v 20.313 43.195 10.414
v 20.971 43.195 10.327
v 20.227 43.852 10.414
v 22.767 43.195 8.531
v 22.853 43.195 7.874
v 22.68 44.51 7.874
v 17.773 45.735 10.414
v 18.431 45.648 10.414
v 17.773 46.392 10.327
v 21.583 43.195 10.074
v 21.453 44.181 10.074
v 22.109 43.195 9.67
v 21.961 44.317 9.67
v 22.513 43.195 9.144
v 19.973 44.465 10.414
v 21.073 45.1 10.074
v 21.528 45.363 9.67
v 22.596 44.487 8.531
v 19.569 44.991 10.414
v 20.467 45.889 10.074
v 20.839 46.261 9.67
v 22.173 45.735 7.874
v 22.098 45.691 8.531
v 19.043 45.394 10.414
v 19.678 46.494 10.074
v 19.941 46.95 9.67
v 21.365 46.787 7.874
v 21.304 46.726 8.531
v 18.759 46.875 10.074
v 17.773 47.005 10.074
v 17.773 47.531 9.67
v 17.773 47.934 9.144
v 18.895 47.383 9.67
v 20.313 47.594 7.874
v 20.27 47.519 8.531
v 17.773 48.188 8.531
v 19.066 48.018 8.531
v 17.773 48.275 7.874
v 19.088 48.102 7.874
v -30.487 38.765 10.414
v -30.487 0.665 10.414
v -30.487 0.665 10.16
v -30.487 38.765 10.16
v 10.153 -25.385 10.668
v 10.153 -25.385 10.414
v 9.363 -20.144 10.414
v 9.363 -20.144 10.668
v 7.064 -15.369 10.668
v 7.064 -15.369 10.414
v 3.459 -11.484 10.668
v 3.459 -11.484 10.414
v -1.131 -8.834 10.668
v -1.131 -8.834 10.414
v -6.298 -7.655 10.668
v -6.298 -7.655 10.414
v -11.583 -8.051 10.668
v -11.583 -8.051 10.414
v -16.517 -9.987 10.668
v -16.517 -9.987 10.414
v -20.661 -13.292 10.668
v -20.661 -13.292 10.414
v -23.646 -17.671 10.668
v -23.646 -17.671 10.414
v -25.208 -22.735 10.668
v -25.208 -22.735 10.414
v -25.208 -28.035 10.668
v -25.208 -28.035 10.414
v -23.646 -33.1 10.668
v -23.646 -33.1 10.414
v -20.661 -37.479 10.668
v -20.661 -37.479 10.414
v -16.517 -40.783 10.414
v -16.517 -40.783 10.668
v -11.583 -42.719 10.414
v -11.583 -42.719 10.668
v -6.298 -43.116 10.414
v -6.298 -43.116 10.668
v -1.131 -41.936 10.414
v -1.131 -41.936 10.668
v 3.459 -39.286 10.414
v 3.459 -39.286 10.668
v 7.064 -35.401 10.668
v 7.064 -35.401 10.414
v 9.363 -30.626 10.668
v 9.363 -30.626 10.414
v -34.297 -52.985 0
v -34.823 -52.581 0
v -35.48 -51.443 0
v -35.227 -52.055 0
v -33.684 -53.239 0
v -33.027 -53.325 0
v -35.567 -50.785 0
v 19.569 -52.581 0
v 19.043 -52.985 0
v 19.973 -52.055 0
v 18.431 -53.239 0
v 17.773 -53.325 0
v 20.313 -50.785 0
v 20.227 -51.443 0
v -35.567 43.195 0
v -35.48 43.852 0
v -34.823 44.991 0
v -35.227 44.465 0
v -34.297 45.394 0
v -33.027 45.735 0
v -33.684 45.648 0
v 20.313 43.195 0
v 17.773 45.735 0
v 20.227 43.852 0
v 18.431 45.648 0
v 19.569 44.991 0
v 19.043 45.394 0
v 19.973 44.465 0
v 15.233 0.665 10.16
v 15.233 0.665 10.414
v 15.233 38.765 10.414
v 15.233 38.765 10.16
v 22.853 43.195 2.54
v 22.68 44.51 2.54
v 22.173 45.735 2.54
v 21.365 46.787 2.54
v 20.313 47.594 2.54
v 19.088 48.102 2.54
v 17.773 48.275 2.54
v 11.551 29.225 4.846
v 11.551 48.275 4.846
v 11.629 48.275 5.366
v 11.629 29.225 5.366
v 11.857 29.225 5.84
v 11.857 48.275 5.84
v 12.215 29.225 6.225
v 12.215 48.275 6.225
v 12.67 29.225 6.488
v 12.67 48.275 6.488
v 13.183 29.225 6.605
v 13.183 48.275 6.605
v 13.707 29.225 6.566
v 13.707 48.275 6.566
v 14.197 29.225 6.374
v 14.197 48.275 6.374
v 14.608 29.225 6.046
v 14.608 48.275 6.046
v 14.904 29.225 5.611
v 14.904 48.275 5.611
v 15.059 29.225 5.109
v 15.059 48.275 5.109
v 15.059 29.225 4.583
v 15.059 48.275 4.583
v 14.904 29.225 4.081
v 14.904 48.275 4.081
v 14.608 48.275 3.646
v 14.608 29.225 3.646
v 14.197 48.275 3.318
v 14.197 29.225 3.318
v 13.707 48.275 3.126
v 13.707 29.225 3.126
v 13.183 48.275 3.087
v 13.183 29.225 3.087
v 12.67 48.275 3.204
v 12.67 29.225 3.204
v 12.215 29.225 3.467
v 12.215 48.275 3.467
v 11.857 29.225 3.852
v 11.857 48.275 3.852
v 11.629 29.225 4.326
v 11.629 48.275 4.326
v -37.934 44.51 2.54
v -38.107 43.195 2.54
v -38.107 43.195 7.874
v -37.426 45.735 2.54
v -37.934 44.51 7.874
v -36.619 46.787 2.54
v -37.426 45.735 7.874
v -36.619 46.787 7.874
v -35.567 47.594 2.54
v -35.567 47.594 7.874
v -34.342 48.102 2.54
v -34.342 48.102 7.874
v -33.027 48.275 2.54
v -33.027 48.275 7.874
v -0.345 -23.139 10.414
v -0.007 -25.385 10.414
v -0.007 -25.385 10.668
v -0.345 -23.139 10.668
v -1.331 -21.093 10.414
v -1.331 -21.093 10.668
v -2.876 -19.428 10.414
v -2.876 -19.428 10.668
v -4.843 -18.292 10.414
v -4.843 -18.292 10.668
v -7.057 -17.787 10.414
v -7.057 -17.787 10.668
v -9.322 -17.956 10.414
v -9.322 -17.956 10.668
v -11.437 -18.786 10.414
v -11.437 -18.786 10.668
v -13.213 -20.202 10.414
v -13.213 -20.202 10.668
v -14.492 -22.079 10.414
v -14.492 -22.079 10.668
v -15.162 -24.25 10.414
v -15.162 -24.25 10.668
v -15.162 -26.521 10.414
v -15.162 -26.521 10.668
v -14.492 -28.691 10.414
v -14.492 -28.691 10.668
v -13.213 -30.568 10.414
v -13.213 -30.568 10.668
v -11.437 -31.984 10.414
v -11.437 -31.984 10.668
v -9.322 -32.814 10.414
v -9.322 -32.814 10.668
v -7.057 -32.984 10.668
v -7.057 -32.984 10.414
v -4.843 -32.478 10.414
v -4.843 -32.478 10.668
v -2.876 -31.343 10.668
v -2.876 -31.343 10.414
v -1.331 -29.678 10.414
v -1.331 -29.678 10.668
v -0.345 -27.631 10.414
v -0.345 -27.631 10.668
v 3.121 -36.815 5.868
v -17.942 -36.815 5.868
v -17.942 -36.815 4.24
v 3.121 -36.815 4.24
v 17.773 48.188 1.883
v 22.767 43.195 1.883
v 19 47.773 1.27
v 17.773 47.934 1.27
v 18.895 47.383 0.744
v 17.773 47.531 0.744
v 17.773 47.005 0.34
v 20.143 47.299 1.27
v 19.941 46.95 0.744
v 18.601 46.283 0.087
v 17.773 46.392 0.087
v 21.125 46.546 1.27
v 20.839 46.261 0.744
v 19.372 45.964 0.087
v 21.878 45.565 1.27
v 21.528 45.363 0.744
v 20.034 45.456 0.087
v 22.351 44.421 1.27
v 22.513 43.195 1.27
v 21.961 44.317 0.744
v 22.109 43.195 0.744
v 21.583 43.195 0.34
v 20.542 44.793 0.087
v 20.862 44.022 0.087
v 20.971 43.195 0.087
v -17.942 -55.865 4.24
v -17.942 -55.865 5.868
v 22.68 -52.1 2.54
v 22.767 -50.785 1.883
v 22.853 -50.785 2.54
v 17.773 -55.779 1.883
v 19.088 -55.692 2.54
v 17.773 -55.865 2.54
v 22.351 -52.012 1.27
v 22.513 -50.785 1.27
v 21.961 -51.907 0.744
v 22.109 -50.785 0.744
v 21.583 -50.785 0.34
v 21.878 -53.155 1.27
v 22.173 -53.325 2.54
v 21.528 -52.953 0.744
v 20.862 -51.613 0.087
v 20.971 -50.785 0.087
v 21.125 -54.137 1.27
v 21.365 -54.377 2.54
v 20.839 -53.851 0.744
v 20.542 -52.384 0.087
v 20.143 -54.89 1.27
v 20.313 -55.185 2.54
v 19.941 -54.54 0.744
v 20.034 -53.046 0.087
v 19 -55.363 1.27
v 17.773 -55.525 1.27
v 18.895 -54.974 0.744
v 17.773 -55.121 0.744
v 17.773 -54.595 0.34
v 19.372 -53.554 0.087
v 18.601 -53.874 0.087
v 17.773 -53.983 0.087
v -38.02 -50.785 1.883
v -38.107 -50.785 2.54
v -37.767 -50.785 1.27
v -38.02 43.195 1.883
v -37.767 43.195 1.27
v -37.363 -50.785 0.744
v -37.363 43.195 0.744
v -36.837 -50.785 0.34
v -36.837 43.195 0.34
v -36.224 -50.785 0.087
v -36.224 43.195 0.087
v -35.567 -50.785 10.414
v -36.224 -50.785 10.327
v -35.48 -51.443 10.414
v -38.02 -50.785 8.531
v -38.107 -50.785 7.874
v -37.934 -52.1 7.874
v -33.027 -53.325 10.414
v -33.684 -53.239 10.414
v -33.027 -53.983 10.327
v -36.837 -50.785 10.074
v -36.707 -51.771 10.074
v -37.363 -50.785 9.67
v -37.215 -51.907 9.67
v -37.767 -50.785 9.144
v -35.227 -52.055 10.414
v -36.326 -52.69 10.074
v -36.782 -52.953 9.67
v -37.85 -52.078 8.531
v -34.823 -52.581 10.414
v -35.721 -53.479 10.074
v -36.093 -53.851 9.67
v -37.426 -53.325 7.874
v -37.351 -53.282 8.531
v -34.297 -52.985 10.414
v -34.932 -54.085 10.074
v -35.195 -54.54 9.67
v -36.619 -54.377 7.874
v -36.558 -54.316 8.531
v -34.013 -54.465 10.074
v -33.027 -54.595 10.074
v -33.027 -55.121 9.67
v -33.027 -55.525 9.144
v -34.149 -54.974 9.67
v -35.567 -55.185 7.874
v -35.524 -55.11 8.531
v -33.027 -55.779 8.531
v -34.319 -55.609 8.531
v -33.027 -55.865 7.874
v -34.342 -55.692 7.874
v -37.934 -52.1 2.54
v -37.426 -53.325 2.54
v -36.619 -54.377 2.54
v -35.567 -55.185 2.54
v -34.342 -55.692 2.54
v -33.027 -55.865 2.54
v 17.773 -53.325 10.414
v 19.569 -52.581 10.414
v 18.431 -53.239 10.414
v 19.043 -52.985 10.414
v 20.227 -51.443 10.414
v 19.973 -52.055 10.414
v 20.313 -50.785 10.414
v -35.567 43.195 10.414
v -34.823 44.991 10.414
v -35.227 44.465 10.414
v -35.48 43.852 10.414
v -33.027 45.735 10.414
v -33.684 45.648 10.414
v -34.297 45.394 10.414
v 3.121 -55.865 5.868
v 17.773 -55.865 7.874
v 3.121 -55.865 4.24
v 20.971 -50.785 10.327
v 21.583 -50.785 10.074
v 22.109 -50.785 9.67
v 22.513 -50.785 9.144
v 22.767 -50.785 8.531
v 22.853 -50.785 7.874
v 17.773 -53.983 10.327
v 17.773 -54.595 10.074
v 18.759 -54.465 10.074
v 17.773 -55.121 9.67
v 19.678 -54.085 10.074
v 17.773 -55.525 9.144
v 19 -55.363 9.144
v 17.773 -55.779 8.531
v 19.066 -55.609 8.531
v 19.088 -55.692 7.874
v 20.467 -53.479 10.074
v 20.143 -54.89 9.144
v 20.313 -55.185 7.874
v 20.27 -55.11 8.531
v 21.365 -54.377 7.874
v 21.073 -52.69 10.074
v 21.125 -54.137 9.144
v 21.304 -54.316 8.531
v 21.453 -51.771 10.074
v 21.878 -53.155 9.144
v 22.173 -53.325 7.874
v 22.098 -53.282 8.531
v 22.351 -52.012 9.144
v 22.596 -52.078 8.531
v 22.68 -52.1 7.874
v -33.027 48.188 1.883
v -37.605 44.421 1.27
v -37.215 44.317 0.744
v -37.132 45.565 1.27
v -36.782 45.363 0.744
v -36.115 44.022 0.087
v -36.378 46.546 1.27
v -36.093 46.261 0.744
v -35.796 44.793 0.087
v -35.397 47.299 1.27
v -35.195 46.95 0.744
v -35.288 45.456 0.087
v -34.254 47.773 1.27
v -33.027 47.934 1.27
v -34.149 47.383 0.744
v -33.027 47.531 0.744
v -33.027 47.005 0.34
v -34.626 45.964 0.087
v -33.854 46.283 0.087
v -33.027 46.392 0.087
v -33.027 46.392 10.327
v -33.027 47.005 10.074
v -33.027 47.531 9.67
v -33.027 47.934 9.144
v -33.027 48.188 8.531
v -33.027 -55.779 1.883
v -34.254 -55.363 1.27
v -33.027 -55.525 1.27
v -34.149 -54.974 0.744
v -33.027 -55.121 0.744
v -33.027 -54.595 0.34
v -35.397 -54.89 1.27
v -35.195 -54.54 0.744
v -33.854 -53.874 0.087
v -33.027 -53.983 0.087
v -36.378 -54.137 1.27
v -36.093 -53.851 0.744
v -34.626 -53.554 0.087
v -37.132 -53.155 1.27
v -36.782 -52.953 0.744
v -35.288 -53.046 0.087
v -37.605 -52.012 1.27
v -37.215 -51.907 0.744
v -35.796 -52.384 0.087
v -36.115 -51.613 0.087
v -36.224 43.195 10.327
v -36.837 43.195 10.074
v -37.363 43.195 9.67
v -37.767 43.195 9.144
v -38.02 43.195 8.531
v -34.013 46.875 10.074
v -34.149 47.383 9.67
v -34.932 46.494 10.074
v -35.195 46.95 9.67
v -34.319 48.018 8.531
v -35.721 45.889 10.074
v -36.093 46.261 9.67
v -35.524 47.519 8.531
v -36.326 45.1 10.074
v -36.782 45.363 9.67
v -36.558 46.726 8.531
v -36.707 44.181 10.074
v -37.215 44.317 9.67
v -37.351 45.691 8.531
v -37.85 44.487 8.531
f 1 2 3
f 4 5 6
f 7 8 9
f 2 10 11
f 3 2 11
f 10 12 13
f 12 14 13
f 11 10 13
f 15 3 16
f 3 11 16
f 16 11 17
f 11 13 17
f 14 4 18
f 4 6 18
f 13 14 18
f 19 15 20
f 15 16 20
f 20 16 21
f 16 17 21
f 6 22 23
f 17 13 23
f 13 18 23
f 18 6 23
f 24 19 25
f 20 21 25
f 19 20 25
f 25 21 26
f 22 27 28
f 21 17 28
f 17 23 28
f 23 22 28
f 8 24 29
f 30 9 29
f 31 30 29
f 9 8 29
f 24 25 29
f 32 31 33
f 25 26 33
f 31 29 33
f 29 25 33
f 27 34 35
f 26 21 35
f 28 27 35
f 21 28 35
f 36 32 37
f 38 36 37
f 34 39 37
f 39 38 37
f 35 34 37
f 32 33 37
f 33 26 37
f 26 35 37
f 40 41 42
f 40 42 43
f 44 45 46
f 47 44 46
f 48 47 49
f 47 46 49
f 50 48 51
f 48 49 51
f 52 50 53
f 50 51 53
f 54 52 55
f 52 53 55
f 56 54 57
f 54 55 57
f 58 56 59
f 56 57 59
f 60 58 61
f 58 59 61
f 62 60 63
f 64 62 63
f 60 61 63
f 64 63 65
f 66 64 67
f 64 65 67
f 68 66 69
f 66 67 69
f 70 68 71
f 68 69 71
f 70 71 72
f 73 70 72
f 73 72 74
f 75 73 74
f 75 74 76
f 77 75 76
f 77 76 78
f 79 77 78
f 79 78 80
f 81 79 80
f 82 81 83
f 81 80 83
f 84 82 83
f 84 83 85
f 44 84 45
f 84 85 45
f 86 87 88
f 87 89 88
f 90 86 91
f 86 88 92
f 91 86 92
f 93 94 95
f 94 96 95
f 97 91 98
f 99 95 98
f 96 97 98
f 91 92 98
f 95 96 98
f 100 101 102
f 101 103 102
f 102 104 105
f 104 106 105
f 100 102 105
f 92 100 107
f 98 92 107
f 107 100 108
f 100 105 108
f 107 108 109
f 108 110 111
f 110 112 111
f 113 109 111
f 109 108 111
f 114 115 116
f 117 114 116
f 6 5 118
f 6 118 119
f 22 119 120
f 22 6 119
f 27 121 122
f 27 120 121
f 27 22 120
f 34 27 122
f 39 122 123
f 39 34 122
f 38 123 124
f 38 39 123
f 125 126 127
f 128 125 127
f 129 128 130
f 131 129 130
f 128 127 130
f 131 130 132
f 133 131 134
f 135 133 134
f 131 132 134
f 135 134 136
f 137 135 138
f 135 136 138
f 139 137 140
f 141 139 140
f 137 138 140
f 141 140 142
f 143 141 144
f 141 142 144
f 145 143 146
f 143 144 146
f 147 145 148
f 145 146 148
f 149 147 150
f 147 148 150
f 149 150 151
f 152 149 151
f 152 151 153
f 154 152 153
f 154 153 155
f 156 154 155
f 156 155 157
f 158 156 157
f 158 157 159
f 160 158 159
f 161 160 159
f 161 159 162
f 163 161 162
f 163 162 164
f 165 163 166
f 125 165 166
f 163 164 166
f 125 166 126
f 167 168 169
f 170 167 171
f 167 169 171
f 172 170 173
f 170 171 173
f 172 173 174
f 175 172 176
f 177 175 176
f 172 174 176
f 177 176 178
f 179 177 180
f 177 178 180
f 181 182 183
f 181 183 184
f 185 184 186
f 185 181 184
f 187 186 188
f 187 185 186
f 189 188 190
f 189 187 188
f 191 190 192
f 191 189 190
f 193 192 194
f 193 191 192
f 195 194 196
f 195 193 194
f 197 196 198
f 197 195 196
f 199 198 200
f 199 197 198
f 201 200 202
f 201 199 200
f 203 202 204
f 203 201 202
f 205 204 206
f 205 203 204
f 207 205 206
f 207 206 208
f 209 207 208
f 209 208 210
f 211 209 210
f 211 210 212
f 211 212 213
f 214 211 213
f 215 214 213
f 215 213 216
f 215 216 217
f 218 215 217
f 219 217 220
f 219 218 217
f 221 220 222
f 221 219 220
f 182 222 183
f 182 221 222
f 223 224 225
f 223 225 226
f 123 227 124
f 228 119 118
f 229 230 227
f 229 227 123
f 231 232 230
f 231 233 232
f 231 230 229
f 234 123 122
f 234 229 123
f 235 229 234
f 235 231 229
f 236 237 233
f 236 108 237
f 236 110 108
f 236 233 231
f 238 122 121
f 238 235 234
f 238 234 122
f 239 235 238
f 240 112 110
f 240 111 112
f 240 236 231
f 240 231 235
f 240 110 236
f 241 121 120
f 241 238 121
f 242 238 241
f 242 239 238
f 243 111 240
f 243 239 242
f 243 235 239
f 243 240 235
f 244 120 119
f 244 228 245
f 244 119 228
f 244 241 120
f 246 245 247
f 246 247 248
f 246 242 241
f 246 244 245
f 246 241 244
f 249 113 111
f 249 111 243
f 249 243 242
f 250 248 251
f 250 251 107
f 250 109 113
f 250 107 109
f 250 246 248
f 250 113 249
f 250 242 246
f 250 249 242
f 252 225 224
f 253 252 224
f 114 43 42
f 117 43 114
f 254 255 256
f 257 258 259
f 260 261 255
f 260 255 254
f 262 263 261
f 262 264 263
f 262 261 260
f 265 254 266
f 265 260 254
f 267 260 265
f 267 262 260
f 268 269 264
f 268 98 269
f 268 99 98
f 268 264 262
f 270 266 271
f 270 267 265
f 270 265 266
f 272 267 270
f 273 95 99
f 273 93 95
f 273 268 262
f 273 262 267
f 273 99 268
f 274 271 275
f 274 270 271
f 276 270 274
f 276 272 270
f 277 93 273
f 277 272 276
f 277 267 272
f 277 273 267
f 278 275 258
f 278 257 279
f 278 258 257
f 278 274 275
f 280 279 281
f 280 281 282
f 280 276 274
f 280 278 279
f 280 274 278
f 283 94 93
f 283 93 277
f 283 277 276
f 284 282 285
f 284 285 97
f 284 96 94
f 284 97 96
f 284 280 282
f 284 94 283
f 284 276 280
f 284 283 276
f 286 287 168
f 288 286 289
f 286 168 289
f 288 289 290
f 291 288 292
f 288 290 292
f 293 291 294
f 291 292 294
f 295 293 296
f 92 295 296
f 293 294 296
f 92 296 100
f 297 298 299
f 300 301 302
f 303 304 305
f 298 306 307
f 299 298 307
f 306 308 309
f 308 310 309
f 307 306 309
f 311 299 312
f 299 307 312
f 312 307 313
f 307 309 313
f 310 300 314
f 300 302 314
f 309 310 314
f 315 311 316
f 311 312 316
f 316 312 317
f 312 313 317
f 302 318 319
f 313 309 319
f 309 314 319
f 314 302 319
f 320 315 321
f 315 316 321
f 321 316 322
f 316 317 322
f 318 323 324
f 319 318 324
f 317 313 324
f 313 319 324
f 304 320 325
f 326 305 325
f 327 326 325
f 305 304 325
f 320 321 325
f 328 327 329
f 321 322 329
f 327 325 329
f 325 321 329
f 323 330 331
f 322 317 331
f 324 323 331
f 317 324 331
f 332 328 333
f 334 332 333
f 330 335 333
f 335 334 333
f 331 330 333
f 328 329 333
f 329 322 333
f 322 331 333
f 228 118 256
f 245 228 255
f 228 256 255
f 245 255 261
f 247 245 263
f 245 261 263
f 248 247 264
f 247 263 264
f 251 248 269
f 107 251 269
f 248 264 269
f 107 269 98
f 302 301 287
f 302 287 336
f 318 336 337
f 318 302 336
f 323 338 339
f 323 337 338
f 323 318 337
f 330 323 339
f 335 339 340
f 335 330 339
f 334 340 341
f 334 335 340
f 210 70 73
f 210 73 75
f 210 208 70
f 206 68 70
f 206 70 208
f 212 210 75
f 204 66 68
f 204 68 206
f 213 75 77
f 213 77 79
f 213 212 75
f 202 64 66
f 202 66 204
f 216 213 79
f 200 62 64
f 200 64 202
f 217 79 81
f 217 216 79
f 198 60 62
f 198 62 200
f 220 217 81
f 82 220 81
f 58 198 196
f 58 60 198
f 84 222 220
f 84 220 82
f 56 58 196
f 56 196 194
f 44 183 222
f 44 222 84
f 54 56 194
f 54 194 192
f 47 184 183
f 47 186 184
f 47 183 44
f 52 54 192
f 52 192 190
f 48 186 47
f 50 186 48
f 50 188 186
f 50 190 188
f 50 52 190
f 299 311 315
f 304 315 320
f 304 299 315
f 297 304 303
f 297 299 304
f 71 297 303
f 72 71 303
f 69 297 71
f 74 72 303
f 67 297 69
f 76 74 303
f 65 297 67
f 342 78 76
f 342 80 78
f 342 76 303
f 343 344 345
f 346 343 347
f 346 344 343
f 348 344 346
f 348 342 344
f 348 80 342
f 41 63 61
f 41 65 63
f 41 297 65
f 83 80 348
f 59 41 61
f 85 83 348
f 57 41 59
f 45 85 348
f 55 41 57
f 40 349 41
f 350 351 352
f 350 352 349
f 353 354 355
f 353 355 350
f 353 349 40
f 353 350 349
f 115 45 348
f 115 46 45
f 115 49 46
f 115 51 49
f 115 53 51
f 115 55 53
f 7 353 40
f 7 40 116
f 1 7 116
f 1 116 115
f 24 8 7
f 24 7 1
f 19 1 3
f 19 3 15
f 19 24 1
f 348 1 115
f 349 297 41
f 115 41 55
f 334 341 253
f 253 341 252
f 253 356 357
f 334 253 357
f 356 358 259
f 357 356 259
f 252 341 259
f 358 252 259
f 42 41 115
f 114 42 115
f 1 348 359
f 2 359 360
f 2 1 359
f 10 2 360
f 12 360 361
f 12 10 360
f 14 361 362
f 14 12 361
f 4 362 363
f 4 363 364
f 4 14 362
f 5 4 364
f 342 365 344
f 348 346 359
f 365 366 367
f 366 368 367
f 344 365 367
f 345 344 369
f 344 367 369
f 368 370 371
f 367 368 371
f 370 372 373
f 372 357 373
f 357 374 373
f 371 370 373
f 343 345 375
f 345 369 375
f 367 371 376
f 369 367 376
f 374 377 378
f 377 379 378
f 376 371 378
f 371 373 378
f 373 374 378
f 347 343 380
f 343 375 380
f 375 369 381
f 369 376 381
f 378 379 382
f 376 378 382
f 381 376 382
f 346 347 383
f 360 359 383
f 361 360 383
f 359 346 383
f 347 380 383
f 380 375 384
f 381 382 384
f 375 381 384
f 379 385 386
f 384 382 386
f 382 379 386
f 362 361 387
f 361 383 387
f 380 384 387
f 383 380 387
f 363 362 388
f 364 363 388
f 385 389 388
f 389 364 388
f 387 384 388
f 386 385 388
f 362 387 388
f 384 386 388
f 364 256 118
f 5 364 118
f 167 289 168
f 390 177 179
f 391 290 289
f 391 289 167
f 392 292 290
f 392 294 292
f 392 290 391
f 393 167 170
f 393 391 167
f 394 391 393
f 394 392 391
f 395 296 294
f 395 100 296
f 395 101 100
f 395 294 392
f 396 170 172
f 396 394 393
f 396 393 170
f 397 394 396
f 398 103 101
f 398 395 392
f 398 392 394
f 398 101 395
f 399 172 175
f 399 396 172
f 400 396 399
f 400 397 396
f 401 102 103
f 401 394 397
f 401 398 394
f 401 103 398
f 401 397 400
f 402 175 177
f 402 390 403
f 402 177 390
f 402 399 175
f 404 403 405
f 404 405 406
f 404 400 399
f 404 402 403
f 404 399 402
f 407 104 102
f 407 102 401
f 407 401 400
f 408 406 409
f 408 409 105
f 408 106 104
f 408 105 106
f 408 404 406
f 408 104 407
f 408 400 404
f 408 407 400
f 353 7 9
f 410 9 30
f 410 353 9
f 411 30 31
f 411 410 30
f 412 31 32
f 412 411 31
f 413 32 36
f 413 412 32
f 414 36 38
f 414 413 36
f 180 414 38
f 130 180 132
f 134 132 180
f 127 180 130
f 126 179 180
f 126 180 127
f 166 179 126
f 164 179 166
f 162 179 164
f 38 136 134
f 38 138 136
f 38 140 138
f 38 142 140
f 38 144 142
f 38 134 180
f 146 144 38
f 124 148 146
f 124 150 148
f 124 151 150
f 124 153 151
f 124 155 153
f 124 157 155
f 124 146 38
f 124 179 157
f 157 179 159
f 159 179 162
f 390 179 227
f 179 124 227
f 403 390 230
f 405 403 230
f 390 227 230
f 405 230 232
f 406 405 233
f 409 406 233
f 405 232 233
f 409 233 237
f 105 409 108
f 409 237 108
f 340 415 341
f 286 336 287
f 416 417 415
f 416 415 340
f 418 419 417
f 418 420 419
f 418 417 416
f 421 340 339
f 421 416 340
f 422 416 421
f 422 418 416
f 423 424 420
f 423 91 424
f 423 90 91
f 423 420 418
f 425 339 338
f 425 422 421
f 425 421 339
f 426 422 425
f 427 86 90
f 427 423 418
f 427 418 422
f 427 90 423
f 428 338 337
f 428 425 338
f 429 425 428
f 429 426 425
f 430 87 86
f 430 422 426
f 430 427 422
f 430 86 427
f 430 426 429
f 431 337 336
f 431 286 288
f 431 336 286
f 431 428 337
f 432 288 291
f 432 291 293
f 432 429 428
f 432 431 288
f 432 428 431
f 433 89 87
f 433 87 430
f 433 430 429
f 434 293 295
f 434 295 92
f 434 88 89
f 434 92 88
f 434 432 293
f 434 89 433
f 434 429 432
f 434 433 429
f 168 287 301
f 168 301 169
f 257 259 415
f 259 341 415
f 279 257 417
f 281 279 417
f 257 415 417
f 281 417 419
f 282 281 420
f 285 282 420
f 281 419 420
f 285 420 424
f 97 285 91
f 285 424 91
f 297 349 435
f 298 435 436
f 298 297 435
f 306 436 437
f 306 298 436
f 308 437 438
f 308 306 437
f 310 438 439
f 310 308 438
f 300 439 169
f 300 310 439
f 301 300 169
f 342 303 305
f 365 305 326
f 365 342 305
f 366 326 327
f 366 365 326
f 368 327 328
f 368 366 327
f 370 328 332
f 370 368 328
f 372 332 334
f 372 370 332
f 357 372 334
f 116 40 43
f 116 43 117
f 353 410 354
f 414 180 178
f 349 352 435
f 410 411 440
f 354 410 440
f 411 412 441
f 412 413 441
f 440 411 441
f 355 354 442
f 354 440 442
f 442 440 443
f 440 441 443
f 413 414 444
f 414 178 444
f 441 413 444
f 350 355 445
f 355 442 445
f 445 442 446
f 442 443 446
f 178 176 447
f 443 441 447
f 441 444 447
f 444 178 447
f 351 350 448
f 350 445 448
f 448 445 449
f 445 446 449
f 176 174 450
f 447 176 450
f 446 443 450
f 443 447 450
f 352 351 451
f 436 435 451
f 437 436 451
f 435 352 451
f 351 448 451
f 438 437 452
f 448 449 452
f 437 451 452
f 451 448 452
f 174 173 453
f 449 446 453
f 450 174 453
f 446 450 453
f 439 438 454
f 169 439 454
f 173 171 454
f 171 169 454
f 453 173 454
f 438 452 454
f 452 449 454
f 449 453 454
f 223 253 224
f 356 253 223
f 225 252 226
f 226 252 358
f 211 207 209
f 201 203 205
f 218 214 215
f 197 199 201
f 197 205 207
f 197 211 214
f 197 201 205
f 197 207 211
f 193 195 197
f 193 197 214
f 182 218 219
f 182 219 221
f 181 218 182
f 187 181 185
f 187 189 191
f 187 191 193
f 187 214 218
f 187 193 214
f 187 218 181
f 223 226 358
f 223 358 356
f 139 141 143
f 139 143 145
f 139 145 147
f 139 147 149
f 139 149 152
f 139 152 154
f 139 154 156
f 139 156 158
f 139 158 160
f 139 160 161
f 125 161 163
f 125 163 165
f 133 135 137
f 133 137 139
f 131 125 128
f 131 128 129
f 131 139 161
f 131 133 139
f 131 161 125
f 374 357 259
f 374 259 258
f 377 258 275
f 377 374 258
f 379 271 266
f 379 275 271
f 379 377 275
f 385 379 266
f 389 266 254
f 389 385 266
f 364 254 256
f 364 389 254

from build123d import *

# Parameters (mm, degrees)
F0_W      = 60.96
F0_H      = 104.14
F1_DEPTH  = 10.414
F2_R      = 5.08
F3_R      = 17.78
F3_R_2    = 7.62
F4_DEPTH  = 0.254
F5_R      = 2.54
F6_W      = 45.72
F6_H      = 38.1
F7_DEPTH  = 0.254
F8_R      = 1.763913
F9_DEPTH  = 19.05
F10_W     = 21.063223
F10_H     = 1.628075
F11_DEPTH = 19.05


with BuildPart() as f1:
    # F0 (on Top) → F1 (new body)
    with BuildSketch(Plane.XY):
        with Locations((-7.626853, -3.795236)):
            Rectangle(F0_W, F0_H)
    extrude(amount=F1_DEPTH)

    # F2
    f2_edges = [f1.edges().sort_by_distance(p)[0] for p in [
        (22.853147, 48.274764, 5.207),
        (-38.106853, 48.274764, 5.207),
        (22.853147, -55.865236, 5.207),
        (-38.106853, -55.865236, 5.207),
    ]]
    fillet(f2_edges, radius=F2_R)

    # F3 (on face) → F4 (join)
    with BuildSketch(Plane.XY.offset(10.414)):
        with Locations((-7.626853, -25.385236)):
            Circle(F3_R)
        with Locations((-7.626853, -25.385236)):
            Circle(F3_R_2, mode=Mode.SUBTRACT)
    extrude(amount=F4_DEPTH)

    # F5
    f5_edges = [f1.edges().sort_by_distance(p)[0] for p in [
        (22.853147, -3.795236, 10.414),
        (-38.106853, -3.795236, 0),
    ]]
    fillet(f5_edges, radius=F5_R)

    # F6 (on face) → F7 (cut)
    with BuildSketch(Plane.XY.offset(10.414)):
        with Locations((-7.626853, 19.714694)):
            Rectangle(F6_W, F6_H)
    extrude(amount=-F7_DEPTH, mode=Mode.SUBTRACT)

    # F8 (on face) → F9 (cut)
    with BuildSketch(Plane(origin=(0, 48.274764, 0), x_dir=(-1, 0, 0), z_dir=(0, 1, 0))):
        with Locations((-13.314613, 4.846008)):
            Circle(F8_R)
    extrude(amount=-F9_DEPTH, mode=Mode.SUBTRACT)

    # F10 (on face) → F11 (cut)
    with BuildSketch(Plane.XZ.offset(55.865236)):
        with Locations((-7.410378, 5.054059)):
            Rectangle(F10_W, F10_H)
    extrude(amount=-F11_DEPTH, mode=Mode.SUBTRACT)


solid = f1.part
